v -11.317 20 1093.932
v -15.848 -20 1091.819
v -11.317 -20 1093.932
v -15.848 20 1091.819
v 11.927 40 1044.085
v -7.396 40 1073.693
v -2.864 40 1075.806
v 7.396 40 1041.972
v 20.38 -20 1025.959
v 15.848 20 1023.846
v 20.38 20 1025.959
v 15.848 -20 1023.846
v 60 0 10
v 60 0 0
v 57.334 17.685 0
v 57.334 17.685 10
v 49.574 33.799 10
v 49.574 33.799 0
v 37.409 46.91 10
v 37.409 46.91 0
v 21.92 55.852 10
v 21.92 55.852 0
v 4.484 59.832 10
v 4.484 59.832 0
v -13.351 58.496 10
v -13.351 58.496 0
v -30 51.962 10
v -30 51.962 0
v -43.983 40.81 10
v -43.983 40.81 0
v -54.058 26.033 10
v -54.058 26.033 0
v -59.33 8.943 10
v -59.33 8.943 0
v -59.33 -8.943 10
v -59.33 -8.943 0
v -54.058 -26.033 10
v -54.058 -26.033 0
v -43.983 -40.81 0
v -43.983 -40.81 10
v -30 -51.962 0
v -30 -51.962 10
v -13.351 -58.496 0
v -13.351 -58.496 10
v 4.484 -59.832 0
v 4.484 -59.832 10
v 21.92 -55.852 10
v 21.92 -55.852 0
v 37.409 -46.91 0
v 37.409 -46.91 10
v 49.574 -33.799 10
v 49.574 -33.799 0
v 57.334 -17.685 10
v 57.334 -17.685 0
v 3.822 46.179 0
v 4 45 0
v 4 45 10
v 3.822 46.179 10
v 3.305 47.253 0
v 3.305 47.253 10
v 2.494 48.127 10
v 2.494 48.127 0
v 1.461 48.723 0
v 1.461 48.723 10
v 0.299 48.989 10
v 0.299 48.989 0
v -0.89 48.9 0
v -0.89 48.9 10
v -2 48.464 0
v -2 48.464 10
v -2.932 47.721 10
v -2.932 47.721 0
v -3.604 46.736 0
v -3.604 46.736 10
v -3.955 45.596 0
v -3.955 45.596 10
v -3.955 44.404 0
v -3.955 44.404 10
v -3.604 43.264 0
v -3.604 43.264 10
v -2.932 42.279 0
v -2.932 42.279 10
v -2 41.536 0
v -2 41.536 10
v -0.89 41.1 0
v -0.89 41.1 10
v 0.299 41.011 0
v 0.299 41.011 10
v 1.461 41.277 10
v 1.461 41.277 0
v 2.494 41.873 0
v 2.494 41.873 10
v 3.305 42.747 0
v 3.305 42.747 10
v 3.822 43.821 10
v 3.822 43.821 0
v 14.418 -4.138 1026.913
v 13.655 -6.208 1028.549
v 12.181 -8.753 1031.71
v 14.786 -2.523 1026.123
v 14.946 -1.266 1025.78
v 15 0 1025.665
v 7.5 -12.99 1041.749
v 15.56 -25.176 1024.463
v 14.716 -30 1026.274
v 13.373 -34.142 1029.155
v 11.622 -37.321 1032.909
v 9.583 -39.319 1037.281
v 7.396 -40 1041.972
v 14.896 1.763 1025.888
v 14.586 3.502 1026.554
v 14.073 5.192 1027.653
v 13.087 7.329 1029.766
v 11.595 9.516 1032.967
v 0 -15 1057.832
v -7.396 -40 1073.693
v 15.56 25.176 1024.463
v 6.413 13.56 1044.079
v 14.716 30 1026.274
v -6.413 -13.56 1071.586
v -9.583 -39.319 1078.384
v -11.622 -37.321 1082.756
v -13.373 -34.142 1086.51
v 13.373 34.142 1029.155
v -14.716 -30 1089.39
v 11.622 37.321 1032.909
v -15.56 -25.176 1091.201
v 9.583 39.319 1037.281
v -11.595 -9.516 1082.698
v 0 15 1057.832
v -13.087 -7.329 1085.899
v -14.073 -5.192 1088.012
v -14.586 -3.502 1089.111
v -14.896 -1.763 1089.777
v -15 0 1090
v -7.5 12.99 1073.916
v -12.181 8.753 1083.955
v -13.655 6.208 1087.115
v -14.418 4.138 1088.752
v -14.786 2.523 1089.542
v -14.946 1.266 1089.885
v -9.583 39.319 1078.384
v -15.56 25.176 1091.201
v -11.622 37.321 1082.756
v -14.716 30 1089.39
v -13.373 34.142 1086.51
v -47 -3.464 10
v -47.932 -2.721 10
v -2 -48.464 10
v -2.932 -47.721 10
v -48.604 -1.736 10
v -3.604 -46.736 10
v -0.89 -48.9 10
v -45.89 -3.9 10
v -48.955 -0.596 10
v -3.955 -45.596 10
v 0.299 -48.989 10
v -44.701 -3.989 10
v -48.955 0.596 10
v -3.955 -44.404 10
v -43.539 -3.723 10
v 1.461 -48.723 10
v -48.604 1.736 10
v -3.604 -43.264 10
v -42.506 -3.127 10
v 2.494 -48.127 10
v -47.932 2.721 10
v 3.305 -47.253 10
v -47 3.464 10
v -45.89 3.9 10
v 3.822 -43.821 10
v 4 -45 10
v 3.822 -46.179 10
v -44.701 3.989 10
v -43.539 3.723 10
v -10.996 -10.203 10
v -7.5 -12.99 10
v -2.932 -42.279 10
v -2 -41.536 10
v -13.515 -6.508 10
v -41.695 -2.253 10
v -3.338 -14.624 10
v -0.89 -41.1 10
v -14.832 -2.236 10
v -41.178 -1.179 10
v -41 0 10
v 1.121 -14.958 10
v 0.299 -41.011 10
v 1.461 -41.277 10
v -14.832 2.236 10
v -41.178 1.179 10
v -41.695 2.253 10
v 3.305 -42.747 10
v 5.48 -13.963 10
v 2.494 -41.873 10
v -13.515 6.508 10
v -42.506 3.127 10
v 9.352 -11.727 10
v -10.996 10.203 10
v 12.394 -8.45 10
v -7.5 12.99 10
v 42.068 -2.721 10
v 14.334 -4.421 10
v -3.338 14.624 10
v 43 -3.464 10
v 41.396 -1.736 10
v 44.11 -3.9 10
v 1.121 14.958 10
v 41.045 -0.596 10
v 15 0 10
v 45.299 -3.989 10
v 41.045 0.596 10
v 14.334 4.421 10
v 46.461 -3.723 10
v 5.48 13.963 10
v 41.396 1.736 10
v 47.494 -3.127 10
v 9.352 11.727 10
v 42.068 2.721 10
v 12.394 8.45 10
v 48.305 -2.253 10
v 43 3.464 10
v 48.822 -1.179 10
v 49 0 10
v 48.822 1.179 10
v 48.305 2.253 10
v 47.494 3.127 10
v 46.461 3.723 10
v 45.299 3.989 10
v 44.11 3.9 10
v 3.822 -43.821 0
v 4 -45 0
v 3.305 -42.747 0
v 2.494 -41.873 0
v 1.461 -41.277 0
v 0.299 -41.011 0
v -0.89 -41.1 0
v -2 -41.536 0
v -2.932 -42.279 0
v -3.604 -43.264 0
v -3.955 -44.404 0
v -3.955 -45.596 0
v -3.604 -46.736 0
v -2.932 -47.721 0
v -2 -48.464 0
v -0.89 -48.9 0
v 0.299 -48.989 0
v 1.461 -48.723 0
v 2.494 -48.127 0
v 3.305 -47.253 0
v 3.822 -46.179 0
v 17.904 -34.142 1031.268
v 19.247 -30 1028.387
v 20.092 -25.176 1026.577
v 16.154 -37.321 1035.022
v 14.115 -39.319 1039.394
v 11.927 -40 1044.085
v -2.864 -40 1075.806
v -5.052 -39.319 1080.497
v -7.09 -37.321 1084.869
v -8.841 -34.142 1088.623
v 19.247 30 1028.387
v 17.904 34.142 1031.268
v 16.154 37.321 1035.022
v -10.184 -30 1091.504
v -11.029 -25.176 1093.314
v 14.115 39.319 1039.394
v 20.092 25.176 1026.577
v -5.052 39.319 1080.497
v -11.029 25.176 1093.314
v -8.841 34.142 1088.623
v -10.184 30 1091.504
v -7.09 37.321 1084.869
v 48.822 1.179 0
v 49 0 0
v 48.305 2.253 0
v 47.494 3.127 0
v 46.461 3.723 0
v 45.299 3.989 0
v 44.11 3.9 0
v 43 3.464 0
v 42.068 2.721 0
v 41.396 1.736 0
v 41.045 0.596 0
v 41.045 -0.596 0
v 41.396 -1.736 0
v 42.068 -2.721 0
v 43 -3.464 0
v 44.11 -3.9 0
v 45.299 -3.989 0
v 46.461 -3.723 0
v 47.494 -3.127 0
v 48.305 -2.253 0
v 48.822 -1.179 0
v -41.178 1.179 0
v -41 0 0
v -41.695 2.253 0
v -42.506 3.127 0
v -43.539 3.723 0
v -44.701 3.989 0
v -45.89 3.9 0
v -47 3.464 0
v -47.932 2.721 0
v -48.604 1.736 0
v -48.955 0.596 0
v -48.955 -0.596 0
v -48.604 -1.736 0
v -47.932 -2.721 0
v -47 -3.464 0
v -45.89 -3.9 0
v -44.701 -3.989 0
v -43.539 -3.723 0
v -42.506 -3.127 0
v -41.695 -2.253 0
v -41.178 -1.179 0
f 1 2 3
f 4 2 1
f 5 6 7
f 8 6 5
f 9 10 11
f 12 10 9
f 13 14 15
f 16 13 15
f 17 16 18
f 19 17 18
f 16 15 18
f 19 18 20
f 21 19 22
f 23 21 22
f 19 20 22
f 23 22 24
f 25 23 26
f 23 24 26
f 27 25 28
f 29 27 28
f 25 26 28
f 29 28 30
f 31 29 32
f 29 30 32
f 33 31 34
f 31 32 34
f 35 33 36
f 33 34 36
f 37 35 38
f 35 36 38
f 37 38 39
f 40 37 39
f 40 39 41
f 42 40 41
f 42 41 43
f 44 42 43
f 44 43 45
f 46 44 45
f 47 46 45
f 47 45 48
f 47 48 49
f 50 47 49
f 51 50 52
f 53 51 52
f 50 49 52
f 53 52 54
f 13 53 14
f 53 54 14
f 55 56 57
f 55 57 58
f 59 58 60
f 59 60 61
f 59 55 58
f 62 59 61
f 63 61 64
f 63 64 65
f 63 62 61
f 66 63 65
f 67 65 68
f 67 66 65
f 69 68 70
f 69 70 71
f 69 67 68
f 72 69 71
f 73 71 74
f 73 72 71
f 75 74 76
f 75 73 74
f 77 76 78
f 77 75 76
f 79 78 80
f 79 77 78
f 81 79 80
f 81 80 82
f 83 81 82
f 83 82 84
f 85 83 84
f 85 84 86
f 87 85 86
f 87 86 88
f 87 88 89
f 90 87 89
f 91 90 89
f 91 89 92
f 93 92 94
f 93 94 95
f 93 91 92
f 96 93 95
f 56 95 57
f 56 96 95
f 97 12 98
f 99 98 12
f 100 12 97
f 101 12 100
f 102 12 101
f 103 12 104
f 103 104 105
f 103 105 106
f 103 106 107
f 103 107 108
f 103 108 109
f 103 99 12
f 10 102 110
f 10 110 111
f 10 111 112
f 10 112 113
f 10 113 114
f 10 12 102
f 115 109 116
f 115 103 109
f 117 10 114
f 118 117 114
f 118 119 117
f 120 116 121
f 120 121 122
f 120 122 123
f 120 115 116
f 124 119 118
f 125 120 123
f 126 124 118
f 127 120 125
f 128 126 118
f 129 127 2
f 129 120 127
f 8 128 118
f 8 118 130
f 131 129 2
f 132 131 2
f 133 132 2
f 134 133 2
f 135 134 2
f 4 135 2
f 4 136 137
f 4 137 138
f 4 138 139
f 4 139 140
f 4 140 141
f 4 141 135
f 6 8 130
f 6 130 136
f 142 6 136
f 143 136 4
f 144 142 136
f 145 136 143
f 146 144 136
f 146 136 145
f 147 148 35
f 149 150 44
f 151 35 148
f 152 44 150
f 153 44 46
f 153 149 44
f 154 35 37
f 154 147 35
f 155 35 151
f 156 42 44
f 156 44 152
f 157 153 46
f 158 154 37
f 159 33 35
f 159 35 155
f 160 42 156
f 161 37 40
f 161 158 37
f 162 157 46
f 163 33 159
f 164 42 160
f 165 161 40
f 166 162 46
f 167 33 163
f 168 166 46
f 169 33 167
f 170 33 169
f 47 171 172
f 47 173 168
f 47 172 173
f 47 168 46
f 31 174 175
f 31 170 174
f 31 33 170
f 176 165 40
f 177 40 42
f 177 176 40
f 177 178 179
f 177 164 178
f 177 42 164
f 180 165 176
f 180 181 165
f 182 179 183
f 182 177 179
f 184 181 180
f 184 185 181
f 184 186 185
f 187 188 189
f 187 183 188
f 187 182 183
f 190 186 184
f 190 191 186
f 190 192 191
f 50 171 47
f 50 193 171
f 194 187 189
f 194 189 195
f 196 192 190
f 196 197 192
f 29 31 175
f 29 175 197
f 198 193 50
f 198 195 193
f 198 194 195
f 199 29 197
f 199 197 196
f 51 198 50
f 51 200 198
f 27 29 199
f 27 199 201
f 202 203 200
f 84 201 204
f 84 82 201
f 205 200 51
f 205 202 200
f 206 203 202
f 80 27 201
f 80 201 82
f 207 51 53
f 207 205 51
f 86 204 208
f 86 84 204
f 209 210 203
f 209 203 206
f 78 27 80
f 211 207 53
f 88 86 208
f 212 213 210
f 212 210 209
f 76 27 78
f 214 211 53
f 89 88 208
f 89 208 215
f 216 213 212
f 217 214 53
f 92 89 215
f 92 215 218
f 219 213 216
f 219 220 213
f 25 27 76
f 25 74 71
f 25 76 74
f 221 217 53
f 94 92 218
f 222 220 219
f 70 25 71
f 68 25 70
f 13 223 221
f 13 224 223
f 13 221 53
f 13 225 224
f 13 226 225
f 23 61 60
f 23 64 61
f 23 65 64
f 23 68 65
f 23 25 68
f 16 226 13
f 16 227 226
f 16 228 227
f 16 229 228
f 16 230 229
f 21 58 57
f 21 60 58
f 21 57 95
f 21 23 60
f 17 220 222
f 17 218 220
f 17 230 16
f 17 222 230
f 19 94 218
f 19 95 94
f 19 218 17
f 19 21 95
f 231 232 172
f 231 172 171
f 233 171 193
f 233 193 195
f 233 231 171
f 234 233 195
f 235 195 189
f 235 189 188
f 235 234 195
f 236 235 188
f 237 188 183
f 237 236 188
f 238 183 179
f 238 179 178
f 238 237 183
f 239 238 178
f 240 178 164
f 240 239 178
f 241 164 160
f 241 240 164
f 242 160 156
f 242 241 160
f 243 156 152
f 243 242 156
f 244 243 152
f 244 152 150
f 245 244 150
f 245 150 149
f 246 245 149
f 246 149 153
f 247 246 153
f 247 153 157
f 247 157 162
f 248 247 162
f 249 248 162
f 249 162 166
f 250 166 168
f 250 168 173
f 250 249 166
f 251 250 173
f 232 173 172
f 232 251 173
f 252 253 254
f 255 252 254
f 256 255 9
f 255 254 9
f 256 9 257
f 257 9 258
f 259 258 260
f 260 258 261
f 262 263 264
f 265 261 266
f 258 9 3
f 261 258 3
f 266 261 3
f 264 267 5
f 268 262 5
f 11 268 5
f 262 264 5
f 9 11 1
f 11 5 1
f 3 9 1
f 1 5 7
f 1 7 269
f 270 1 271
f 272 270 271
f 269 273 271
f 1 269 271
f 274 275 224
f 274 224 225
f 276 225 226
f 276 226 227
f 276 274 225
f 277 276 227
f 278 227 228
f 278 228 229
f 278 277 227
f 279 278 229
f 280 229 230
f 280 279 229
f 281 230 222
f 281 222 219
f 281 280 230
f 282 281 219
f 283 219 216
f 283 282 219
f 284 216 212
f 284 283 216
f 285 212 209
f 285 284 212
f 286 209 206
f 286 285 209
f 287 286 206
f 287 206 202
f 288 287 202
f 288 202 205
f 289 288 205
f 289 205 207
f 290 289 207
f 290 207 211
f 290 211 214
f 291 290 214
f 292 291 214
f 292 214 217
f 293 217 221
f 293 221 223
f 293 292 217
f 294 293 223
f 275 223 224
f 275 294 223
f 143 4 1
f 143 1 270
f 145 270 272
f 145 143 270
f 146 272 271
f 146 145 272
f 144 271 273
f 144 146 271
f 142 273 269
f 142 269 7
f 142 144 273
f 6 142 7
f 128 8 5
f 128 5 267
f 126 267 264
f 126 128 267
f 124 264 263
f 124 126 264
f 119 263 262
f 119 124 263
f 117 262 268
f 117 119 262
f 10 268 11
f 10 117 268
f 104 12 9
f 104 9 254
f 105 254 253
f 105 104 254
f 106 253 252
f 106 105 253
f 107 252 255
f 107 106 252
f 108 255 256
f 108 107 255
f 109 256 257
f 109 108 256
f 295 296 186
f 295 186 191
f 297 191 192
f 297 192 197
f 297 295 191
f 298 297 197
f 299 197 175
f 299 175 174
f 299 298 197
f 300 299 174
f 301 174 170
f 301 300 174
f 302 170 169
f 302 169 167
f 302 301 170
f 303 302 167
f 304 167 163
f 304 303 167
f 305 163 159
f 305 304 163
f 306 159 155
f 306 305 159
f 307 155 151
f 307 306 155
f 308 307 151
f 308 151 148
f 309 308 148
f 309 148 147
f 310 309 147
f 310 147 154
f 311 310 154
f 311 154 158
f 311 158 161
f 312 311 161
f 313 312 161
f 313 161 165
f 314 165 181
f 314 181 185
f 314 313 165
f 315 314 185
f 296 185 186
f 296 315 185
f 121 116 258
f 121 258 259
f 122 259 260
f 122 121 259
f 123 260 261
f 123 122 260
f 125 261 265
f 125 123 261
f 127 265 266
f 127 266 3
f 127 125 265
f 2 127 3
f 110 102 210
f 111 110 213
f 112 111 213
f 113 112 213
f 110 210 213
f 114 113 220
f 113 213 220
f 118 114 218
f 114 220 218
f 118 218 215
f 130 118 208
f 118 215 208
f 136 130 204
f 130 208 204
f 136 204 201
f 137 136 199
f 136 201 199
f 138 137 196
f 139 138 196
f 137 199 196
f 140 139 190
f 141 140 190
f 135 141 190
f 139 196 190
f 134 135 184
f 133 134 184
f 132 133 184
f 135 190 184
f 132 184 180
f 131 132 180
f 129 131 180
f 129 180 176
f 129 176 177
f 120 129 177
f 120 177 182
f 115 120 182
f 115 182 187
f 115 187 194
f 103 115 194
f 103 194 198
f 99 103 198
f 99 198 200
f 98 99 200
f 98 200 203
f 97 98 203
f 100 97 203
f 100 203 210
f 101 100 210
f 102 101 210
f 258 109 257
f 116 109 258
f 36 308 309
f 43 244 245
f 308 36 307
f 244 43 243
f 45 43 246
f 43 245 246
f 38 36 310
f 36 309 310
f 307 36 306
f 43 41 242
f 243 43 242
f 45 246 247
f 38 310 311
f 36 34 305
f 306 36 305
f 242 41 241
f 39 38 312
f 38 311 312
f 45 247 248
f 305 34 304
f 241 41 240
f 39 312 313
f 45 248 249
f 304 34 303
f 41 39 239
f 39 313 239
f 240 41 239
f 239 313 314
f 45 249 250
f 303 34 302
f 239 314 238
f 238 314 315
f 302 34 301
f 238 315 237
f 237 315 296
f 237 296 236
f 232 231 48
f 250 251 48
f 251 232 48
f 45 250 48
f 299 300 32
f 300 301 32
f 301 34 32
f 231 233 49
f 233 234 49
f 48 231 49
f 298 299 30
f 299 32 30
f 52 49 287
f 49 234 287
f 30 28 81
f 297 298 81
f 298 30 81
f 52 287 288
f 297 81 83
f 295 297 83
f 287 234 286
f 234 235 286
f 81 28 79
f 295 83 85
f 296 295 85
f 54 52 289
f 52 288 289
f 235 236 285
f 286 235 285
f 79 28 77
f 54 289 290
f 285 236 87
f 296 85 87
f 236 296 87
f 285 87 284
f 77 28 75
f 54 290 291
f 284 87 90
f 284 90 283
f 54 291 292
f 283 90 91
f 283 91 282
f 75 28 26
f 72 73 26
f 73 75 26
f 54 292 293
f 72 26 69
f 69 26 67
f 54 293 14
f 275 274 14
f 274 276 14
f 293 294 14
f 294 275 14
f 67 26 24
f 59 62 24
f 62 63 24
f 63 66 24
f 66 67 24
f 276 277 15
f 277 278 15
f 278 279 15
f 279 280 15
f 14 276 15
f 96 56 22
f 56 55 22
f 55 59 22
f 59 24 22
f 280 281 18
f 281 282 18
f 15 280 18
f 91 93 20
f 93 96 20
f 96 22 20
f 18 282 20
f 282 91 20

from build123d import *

# Parameters (mm, degrees)
SKETCH1_R           = 60
SKETCH1_R_2         = 4
BOSS_EXTRUDE1_DEPTH = 10
SKETCH2_R           = 15
BOSS_EXTRUDE2_DEPTH = 1080
CUT_EXTRUDE1_REACH  = 1017.827
SKETCH4_W           = 30
SKETCH4_H           = 150
BOSS_EXTRUDE3_DEPTH = 5


with BuildPart() as part:
    # Sketch1 → Boss-Extrude1 (new body)
    with BuildSketch(Plane.XY):
        Circle(SKETCH1_R)
        with Locations((0, 45)):
            Circle(SKETCH1_R_2, mode=Mode.SUBTRACT)
        with Locations((45, 0)):
            Circle(SKETCH1_R_2, mode=Mode.SUBTRACT)
        with Locations((0, -45)):
            Circle(SKETCH1_R_2, mode=Mode.SUBTRACT)
        with Locations((-45, 0)):
            Circle(SKETCH1_R_2, mode=Mode.SUBTRACT)
    extrude(amount=BOSS_EXTRUDE1_DEPTH)

    # Sketch2 → Boss-Extrude2 (add)
    with BuildSketch(Plane.XY.offset(10)):
        Circle(SKETCH2_R)
    extrude(amount=BOSS_EXTRUDE2_DEPTH)

    # Sketch4 → Cut-Extrude1 (cut, up to next)
    with BuildSketch(Plane(origin=(405.173314427, 0, 188.935419397), x_dir=(0, -1, 0), z_dir=(0.906307787036651, 0, 0.4226182617406972)), mode=Mode.PRIVATE) as cut_extrude1_sk1:
        with Locations((0, -987.87548787)):
            Rectangle(SKETCH4_W, SKETCH4_H)
    cut_extrude1_tool1 = extrude(cut_extrude1_sk1.sketch, amount=CUT_EXTRUDE1_REACH, mode=Mode.PRIVATE) & part.part
    add(cut_extrude1_tool1.solids().sort_by_distance((-12.320907, 0, 1084.254667))[0], mode=Mode.SUBTRACT)

    # Sketch5 → Boss-Extrude3 (add)
    with BuildSketch(Plane(origin=(405.173314427, 0, 188.935419397), x_dir=(0.42261826174069705, 0, -0.906307787036651), z_dir=(0.906307787036651, 0, 0.42261826174069705))):
        with BuildLine():
            Line((-941.221738049, -40), (-976.221738049, -40))
            ThreePointArc((-976.221738049, -40), (-990.363873672, -34.142135624), (-996.221738049, -20))
            Line((-996.221738049, -20), (-996.221738049, 20))
            ThreePointArc((-996.221738049, 20), (-990.363873672, 34.142135624), (-976.221738049, 40))
            Line((-976.221738049, 40), (-941.221738049, 40))
            ThreePointArc((-941.221738049, 40), (-927.079602425, 34.142135624), (-921.221738049, 20))
            Line((-921.221738049, 20), (-921.221738049, -20))
            ThreePointArc((-921.221738049, -20), (-927.079602425, -34.142135624), (-941.221738049, -40))
        make_face()
    extrude(amount=BOSS_EXTRUDE3_DEPTH)


solid = part.part
